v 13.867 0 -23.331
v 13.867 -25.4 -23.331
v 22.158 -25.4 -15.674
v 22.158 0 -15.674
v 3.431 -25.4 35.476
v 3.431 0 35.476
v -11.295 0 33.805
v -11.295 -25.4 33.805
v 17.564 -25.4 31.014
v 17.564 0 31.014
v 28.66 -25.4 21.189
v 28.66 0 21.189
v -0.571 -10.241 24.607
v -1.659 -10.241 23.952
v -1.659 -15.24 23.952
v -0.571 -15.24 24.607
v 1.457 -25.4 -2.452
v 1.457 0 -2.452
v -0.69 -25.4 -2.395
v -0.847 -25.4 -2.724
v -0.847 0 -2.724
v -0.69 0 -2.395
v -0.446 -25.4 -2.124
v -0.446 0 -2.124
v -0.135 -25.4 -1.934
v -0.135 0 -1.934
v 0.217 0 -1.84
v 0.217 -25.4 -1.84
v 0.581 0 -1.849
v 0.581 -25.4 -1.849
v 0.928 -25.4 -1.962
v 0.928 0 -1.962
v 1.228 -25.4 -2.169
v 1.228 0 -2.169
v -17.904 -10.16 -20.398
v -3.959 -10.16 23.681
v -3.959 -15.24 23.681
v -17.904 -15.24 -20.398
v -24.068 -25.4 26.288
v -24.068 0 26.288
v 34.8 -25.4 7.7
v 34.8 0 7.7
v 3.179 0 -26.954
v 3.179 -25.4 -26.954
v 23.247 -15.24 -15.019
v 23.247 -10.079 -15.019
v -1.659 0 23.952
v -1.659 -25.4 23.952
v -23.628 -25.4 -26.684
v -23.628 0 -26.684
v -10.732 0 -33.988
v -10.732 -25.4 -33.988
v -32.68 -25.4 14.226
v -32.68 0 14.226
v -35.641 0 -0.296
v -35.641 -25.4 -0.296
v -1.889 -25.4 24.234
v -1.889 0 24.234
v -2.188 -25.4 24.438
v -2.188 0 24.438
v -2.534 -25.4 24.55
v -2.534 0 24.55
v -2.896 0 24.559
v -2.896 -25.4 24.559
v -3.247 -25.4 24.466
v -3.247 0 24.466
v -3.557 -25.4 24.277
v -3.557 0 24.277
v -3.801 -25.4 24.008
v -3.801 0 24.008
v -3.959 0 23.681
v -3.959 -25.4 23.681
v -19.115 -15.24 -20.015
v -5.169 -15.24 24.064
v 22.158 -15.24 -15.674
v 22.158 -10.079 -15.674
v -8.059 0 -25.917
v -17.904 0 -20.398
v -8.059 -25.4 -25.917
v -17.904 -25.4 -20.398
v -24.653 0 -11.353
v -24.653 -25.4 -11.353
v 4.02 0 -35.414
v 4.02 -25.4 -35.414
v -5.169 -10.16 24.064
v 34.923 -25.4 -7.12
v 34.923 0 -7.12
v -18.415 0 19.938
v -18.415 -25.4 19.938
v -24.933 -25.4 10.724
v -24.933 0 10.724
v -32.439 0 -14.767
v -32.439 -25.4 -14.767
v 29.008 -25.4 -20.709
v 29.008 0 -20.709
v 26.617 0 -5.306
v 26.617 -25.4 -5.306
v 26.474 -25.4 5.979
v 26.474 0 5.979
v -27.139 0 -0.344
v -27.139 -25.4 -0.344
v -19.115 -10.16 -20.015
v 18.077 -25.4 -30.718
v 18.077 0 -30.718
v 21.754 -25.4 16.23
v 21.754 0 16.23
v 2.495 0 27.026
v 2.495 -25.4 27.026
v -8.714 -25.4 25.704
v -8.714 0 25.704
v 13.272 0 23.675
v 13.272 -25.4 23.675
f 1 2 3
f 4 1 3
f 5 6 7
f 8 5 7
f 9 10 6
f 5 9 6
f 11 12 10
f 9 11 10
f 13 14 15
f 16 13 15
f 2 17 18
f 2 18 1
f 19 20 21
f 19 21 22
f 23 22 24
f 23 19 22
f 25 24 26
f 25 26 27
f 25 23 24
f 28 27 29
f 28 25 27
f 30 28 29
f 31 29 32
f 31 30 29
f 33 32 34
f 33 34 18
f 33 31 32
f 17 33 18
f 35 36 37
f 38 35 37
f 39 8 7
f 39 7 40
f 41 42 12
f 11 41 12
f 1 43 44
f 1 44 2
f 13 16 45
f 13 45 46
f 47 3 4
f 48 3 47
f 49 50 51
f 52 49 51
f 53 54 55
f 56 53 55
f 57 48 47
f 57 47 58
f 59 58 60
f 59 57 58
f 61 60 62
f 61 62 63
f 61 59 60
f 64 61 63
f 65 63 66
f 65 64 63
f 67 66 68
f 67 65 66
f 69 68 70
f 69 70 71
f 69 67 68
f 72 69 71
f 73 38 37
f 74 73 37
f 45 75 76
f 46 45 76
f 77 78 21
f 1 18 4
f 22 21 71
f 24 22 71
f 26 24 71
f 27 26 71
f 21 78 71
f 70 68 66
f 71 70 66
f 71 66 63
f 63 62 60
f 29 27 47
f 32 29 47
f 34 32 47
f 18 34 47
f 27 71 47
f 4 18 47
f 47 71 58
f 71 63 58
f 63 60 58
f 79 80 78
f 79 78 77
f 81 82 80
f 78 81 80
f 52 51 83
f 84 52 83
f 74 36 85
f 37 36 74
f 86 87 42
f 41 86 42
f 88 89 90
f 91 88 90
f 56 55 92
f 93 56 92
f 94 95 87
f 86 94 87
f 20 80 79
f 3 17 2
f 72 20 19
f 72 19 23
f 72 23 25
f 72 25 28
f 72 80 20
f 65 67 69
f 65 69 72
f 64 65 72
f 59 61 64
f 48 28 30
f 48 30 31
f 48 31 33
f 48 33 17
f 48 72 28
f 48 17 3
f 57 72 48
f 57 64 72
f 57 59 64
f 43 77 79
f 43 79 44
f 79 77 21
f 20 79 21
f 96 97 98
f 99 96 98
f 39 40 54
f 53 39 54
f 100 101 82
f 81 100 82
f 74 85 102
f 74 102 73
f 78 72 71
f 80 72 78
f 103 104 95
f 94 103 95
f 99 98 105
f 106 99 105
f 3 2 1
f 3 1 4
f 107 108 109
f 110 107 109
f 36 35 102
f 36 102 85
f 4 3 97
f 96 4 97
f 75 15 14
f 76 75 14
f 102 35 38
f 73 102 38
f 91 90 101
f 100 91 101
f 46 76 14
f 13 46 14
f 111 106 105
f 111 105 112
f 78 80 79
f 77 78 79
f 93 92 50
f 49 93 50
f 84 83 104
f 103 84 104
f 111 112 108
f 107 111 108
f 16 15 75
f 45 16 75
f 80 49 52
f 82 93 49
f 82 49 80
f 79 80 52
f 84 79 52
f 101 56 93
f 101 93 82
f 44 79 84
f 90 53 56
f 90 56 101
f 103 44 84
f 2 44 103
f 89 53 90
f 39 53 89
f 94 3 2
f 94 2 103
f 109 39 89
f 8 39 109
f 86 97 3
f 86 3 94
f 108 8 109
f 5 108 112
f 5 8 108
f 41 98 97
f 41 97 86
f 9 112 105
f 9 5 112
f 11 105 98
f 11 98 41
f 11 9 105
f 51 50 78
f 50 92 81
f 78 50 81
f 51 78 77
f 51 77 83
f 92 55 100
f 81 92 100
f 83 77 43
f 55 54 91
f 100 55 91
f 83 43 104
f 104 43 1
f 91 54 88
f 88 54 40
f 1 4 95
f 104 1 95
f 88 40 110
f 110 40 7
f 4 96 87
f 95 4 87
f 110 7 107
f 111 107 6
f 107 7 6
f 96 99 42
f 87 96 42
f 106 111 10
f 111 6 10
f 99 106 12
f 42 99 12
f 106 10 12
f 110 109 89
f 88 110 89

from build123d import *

# Parameters (mm, degrees)
F1_DEPTH = 25.4
F3_DEPTH = 25.4
F5_DEPTH = 25.4
F6_W     = 5.08
F6_H     = 46.232947318
F7_DEPTH = 1.27
F9_DEPTH = 1.27


with BuildPart() as f1:
    # F0 (on Front) → F1 (new body)
    with BuildSketch(Plane.XZ):
        Polygon((-11.2952926929, 33.8047836351), (-24.068407548, 26.287997104), (-32.6798760834, 14.2257770546), (-35.6406971566, -0.2962090846), (-32.4389179059, -14.7669779821), (-23.628155051, -26.6844022328), (-10.7318695327, -33.9878509172), (4.0200537238, -35.4144914081), (18.0768731704, -30.7176446039), (29.0080370226, -20.7094379868), (34.9234477439, -7.1203814023), (34.8002770806, 7.6998538132), (28.6598223596, 21.1887143534), (17.5638239862, 31.0138536885), (3.4308808833, 35.4764159689), align=None)
    extrude(amount=F1_DEPTH)

    # F2 (on face) → F3 (cut)
    with BuildSketch(Plane.XZ.offset(25.4)):
        Polygon((2.4946959605, 27.0262285687), (-8.7135393202, 25.7043726067), (-18.4151244923, 19.937997104), (-24.9325673436, 10.724160771), (-27.1389427959, -0.3439803852), (-24.6527484893, -11.3526442079), (-17.9038700056, -20.3983327115), (-8.0592497465, -25.9169641762), (3.1788880099, -26.9543170866), (13.86736715, -23.3310237005), (22.1580525288, -15.6735843609), (26.6174093258, -5.3060398952), (26.4743742388, 5.9789670722), (21.7536793338, 16.2301563156), (13.271575646, 23.6750040857), align=None)
    extrude(amount=-F3_DEPTH, mode=Mode.SUBTRACT)


with BuildPart() as f5:
    # F4 (on face) → F5 (new body)
    with BuildSketch(Plane.XZ.offset(25.4)):
        with BuildLine():
            Line((-17.9038700056, -20.3983327115), (-8.0592497465, -25.9169641762))
            Line((-8.0592497465, -25.9169641762), (-0.847007762, -2.7238105922))
            ThreePointArc((-0.847007762, -2.7238105922), (0.2169628448, -1.839663837), (1.4574269298, -2.4520344686))
            Line((1.4574269298, -2.4520344686), (13.86736715, -23.3310237005))
            Line((13.86736715, -23.3310237005), (22.1580525288, -15.6735843609))
            Line((22.1580525288, -15.6735843609), (-1.6591908606, 23.9524719031))
            ThreePointArc((-1.6591908606, 23.9524719031), (-2.8964502898, 24.5594809551), (-3.9585514638, 23.681294198))
            Line((-3.9585514638, 23.681294198), (-17.9038700056, -20.3983327115))
        make_face()
    extrude(amount=-F5_DEPTH)


with BuildPart() as f7:
    # F6 (on face) → F7 (new body)
    with BuildSketch(Plane(origin=(-10.408733288, 0, 3.2929748162), x_dir=(0, -1, 0), z_dir=(-0.9534245482, 0, 0.3016316145))):
        with Locations((12.7, -1.7321707061)):
            Rectangle(F6_W, F6_H)
    extrude(amount=F7_DEPTH)


with BuildPart() as f9:
    # F8 (on face) → F9 (new body)
    with BuildSketch(Plane(origin=(9.3570903346, 0, 5.6240796821), x_dir=(0, 1, 0), z_dir=(0.8570956117, 0, 0.5151573666))):
        Polygon((-10.2407539417, 21.3843029529), (-15.24, 21.3843029529), (-15.24, -24.8486443651), (-10.0793698555, -24.8486443651), align=None)
    extrude(amount=F9_DEPTH)


solid = Compound([f1.part, f5.part, f7.part, f9.part])
